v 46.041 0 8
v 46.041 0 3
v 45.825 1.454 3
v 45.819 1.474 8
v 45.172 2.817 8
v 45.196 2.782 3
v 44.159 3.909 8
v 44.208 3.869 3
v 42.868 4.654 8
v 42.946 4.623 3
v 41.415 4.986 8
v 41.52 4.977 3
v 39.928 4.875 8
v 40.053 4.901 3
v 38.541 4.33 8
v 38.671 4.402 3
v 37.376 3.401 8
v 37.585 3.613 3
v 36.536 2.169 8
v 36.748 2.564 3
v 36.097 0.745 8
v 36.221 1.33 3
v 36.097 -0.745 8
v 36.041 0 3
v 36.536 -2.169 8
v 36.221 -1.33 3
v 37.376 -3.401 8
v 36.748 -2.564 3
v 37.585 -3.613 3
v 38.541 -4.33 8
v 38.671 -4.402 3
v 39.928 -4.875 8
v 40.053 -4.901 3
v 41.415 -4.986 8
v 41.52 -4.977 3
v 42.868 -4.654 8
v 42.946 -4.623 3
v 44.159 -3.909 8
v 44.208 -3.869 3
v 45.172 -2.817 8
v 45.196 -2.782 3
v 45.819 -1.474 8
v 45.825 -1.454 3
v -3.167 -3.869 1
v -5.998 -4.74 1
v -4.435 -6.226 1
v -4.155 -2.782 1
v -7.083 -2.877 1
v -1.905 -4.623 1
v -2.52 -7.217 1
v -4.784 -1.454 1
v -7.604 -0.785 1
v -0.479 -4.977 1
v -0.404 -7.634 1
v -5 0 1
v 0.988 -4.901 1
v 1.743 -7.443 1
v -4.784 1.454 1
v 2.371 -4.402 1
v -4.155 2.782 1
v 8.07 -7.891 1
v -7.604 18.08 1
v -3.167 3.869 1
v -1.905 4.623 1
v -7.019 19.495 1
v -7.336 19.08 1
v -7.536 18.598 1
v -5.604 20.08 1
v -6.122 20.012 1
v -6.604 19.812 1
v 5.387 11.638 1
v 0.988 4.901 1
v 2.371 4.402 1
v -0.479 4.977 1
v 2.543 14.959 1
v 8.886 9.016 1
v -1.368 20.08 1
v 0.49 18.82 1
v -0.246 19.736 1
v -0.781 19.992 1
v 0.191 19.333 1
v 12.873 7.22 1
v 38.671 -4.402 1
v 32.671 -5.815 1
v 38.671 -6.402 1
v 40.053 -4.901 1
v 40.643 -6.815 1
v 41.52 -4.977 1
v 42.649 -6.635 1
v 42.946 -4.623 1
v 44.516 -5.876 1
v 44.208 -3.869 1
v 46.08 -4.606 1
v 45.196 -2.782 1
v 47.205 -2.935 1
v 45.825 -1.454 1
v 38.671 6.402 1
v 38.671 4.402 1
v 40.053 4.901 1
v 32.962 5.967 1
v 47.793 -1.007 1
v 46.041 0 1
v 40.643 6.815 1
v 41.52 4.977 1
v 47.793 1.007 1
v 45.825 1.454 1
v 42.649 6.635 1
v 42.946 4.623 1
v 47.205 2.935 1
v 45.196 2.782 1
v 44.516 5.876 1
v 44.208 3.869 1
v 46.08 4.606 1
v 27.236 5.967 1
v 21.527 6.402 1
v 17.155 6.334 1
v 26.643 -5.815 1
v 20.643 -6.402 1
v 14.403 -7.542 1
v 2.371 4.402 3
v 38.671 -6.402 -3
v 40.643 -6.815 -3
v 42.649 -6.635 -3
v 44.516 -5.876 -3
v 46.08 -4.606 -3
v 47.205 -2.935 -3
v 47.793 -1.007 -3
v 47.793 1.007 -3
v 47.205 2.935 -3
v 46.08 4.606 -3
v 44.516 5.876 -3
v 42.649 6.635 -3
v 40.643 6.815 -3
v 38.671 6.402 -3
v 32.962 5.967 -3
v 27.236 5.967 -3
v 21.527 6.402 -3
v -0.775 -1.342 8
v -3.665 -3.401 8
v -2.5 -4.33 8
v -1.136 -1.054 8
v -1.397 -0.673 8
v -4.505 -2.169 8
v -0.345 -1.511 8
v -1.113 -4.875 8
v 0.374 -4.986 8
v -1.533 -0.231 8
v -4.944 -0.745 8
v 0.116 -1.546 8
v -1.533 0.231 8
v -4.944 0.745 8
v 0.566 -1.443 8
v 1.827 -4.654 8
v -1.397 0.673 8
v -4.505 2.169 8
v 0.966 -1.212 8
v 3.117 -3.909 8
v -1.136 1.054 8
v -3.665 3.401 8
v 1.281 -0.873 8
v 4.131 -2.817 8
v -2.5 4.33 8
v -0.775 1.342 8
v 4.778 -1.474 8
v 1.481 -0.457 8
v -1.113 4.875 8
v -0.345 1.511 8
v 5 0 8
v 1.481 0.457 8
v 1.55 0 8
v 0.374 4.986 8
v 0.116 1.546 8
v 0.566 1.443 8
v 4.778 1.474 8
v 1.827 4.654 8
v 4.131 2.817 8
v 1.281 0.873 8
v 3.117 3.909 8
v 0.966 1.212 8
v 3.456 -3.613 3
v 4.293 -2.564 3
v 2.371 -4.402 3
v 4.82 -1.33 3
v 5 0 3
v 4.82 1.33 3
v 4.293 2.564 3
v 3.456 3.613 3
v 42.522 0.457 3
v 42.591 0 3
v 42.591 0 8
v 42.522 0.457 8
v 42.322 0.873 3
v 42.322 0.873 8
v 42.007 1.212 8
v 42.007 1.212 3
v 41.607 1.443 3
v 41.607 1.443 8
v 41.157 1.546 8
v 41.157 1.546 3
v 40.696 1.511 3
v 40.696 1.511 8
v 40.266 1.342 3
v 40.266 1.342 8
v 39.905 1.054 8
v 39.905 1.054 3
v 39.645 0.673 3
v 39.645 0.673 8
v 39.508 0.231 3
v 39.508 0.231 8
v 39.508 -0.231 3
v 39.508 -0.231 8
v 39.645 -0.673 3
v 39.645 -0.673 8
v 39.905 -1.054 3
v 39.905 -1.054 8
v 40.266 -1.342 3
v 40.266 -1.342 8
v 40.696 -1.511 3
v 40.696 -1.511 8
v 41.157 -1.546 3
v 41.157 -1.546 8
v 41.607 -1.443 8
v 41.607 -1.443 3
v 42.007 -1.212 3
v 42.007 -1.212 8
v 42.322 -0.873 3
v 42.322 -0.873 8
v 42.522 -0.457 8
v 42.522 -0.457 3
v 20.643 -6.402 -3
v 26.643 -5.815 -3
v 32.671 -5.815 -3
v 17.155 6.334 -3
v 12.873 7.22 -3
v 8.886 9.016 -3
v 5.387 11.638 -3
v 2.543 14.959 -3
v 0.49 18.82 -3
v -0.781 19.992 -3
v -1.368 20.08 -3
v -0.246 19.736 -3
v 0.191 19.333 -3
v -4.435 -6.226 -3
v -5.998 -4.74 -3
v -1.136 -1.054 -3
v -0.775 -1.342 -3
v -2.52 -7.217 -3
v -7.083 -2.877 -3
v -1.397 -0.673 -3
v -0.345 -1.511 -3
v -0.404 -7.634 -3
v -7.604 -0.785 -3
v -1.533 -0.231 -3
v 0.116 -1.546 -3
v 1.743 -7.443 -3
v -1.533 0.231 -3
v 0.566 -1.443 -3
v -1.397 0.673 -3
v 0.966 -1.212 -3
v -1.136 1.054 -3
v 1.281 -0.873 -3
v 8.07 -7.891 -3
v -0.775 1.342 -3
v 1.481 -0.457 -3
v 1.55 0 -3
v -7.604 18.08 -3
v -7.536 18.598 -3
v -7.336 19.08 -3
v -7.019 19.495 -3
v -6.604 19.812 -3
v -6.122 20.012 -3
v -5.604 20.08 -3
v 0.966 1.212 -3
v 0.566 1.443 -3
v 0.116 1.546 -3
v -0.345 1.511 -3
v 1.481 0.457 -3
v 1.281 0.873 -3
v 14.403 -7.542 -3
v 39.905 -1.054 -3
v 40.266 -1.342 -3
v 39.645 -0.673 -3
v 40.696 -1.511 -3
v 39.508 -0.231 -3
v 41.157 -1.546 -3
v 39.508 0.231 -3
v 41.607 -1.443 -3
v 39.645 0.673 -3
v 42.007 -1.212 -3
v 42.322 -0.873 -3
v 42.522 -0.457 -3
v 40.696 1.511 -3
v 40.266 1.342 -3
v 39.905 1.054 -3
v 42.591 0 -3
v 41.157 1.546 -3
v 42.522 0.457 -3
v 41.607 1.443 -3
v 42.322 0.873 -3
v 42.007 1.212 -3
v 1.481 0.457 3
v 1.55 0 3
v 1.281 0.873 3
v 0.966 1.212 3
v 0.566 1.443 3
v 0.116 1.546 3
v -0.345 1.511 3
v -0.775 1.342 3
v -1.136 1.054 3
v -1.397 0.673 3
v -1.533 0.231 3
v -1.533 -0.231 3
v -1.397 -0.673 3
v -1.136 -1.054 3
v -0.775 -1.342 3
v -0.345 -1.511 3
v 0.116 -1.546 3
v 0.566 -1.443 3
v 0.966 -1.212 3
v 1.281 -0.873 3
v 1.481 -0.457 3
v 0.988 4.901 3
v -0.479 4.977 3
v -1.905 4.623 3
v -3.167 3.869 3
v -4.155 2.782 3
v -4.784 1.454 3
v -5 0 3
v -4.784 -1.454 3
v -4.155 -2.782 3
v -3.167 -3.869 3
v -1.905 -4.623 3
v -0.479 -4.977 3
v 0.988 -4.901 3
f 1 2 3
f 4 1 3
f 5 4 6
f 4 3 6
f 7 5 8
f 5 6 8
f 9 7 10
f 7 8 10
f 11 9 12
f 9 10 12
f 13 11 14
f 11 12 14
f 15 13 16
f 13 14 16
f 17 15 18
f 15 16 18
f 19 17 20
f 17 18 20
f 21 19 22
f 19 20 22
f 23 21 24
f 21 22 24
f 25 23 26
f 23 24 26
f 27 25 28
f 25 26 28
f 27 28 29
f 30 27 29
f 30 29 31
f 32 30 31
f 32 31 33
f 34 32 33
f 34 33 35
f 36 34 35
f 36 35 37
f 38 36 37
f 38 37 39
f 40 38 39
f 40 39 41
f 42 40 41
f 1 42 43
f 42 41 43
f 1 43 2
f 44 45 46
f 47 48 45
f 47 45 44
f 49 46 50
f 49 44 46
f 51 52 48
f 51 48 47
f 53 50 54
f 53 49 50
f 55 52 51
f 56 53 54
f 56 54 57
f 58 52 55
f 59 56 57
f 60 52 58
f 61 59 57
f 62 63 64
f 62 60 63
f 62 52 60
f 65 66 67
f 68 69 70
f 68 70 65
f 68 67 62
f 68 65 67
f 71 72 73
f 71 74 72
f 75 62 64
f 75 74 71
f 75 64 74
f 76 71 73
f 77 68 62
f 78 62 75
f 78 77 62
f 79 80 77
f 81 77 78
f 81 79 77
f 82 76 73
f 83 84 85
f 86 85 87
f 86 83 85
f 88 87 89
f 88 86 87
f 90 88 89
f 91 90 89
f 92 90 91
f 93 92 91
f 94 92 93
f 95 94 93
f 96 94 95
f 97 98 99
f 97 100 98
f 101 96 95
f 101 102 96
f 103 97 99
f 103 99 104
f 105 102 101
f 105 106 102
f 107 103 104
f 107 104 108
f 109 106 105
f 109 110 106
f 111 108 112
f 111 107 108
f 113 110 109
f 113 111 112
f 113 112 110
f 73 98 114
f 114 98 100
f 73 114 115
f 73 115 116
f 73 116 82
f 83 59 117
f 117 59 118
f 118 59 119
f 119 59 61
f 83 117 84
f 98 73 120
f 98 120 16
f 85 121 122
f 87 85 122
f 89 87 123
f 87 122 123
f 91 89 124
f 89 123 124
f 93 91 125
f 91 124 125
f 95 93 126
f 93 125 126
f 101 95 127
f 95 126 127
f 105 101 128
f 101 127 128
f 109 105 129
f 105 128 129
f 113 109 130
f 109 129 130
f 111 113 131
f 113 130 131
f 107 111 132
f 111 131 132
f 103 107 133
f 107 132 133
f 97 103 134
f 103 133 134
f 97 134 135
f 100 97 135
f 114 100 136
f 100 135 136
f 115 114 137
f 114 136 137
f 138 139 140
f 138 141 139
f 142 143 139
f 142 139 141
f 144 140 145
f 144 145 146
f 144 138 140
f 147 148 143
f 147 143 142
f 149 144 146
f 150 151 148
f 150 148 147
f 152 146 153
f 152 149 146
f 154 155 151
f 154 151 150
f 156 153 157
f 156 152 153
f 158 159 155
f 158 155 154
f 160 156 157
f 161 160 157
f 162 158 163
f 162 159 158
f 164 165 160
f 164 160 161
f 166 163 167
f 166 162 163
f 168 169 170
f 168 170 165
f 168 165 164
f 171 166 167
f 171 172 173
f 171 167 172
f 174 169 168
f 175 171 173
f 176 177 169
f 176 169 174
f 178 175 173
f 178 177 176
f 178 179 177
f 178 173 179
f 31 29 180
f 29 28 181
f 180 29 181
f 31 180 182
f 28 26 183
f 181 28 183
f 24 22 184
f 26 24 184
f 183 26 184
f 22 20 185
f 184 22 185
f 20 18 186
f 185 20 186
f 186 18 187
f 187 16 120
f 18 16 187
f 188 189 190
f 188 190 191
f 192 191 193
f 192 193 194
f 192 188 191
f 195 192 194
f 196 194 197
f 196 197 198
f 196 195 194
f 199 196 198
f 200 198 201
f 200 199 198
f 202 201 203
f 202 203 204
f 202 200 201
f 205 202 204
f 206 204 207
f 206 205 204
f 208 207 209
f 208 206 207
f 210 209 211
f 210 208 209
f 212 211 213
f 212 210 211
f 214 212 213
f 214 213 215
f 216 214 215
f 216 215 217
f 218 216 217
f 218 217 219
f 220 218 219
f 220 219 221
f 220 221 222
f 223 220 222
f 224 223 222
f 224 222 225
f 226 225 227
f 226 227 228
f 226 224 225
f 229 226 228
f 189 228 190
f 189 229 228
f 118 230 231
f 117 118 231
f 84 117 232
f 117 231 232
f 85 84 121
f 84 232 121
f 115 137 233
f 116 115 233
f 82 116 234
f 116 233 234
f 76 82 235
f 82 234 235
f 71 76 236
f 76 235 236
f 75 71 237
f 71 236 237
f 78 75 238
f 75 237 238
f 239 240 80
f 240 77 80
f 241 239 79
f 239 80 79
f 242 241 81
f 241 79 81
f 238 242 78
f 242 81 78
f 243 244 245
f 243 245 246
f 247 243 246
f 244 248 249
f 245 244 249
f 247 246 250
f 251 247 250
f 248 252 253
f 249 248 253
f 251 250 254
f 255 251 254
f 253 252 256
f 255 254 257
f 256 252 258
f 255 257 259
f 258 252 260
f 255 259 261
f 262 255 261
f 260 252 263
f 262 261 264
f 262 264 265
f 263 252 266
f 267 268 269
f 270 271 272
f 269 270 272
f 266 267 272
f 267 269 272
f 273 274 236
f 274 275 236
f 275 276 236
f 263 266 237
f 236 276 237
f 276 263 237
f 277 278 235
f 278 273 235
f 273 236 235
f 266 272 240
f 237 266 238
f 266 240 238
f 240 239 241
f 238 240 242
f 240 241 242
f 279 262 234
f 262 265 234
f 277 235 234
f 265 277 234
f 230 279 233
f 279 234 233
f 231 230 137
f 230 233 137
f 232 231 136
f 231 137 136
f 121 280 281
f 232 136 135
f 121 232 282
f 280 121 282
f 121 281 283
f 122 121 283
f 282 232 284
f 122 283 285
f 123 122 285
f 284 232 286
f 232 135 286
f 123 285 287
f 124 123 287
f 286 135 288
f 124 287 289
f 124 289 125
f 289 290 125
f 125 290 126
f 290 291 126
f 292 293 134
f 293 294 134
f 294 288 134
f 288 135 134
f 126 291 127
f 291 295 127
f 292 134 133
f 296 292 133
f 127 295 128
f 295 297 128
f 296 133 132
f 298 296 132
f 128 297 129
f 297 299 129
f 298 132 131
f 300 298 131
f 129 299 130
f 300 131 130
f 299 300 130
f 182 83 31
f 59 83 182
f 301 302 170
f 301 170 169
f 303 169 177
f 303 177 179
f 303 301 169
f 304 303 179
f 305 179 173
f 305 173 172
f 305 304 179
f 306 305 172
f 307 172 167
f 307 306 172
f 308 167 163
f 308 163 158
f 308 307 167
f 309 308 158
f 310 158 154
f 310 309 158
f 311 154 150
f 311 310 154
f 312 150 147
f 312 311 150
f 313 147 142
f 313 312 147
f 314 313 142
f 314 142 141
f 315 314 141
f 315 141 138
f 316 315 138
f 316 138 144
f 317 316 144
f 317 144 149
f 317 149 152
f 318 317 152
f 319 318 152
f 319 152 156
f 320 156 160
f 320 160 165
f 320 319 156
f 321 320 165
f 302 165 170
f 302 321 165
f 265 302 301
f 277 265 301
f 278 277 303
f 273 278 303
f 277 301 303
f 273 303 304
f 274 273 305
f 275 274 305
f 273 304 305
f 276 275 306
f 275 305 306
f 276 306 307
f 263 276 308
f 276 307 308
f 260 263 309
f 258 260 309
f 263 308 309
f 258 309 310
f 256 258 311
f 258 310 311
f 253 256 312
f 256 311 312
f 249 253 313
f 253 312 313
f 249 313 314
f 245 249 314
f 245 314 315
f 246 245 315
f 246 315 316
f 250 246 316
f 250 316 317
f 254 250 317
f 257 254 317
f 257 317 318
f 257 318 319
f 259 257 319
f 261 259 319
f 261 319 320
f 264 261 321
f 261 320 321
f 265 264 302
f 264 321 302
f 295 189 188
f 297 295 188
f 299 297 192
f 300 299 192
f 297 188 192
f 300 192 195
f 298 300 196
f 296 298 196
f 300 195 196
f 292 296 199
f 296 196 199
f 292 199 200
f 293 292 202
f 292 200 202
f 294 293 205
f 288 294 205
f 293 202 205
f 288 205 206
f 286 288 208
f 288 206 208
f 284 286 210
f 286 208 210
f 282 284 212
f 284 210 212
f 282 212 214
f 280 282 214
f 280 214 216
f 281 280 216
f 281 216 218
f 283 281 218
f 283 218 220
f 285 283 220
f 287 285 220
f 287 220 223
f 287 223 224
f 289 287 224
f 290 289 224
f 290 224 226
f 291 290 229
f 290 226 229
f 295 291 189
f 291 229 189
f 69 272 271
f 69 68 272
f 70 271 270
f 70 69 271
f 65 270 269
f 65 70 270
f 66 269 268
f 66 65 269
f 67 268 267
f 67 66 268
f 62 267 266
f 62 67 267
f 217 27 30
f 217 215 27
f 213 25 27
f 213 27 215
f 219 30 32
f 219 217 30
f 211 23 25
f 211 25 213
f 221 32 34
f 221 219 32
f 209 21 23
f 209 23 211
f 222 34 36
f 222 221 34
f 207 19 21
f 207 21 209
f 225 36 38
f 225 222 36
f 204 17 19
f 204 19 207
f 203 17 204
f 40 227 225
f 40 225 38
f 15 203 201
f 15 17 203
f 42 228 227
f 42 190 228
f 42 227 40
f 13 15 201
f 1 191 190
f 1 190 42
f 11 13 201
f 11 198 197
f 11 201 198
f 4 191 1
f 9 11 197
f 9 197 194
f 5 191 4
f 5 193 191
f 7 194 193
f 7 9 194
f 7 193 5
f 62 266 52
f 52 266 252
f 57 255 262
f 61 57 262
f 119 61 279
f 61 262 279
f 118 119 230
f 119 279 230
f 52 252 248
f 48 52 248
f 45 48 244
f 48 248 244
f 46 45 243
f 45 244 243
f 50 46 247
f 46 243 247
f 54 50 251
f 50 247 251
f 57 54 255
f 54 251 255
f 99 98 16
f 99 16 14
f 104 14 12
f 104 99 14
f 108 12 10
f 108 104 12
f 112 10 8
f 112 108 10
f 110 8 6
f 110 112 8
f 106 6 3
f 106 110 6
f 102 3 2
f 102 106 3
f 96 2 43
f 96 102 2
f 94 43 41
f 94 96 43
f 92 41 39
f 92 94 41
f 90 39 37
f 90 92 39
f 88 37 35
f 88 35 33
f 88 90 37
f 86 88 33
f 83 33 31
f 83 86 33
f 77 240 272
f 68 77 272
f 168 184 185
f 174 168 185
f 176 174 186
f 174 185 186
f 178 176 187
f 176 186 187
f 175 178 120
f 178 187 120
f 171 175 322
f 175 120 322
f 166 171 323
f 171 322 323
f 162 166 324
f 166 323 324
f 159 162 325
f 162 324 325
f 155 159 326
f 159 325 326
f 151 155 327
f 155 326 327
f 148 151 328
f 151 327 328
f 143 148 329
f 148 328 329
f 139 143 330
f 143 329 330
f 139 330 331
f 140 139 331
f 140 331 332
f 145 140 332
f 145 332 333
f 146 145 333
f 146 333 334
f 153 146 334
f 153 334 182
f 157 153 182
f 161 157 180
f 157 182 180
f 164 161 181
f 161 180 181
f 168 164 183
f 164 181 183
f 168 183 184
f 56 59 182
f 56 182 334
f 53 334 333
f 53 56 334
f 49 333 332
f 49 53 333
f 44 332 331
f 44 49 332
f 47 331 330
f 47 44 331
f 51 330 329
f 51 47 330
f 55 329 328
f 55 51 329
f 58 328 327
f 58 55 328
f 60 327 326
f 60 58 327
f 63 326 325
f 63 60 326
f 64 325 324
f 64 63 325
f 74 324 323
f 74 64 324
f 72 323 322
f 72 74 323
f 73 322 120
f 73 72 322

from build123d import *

# Parameters (mm, degrees)
BOSS_EXTRU_1_DEPTH      = 3
BOSS_EXTRU_1_DEPTH_BACK = 3
ESQUISSE2_R             = 1.55
ENL_V_MAT_EXTRU_1_DEPTH = 6
SKETCH1_R               = 5
SKETCH1_R_2             = 1.55
BOSS_EXTRUDE1_DEPTH     = 5
BOSS_EXTRUDE3_DEPTH     = 4
FILLET1_R               = 2


with BuildPart() as part:
    # Esquisse1 → Boss.-Extru.1 (new, two sides: drawn at the far end of the back side and taken through both)
    with BuildSketch(Plane.XY.offset(-BOSS_EXTRU_1_DEPTH_BACK)):
        with BuildLine():
            Line((2.370532565, 4.402337488), (38.670532565, 4.402337488))
            ThreePointArc((38.670532565, 4.402337488), (46.041065131, 0), (38.670532565, -4.402337488))
            Line((38.670532565, -4.402337488), (2.370532565, -4.402337488))
            ThreePointArc((2.370532565, -4.402337488), (-5, 0), (2.370532565, 4.402337488))
        make_face()
    extrude(amount=BOSS_EXTRU_1_DEPTH + BOSS_EXTRU_1_DEPTH_BACK)

    # Esquisse2 → Enlèv. mat.-Extru.1 (cut)
    with BuildSketch(Plane.XY.offset(3)):
        Circle(ESQUISSE2_R)
        with Locations((41.041065131, 0)):
            Circle(ESQUISSE2_R)
    extrude(amount=-ENL_V_MAT_EXTRU_1_DEPTH, mode=Mode.SUBTRACT)

    # Sketch1 → Boss-Extrude1 (add)
    # profile 1 of 2: a face of its own
    with BuildSketch(Plane.XY.offset(3)):
        Circle(SKETCH1_R)
        Circle(SKETCH1_R_2, mode=Mode.SUBTRACT)
    # profile 2 of 2: a face of its own
    with BuildSketch(Plane.XY.offset(3)):
        with Locations((41.041065131, 0)):
            Circle(SKETCH1_R)
        with Locations((41.041065131, 0)):
            Circle(SKETCH1_R_2, mode=Mode.SUBTRACT)
    extrude(amount=BOSS_EXTRUDE1_DEPTH)

    # Sketch3 → Boss-Extrude3 (add)
    with BuildSketch(Plane(origin=(0, 0, -3), x_dir=(-1, 0, 0), z_dir=(0, 0, -1))):
        with BuildLine():
            Line((-0.036278369, 20.080410503), (7.604339365, 20.080410503))
            Line((7.604339365, 20.080410503), (7.604339365, -0.784525769))
            ThreePointArc((7.604339365, -0.784525769), (4.435345697, -6.226489092), (-1.743406195, -7.443251487))
            ThreePointArc((-1.743406195, -7.443251487), (-11.242367754, -7.816197838), (-20.642918726, -6.402337488))
            ThreePointArc((-20.642918726, -6.402337488), (-29.656725646, -5.741977649), (-38.670532565, -6.402337488))
            ThreePointArc((-38.670532565, -6.402337488), (-47.868169198, 0), (-38.670532565, 6.402337488))
            ThreePointArc((-38.670532565, 6.402337488), (-30.098734584, 5.912843699), (-21.526936603, 6.402337488))
            ThreePointArc((-21.526936603, 6.402337488), (-8.31538788, 9.366509266), (-0.036278369, 20.080410503))
        make_face()
        with BuildLine():
            Line((-38.670532565, 4.402337488), (-2.370532565, 4.402337488))
            ThreePointArc((-2.370532565, 4.402337488), (5, 0), (-2.370532565, -4.402337488))
            Line((-2.370532565, -4.402337488), (-38.670532565, -4.402337488))
            ThreePointArc((-38.670532565, -4.402337488), (-46.041065131, 0), (-38.670532565, 4.402337488))
        make_face(mode=Mode.SUBTRACT)
    extrude(amount=-BOSS_EXTRUDE3_DEPTH)

    # Fillet1
    fillet1_edges = [part.edges().sort_by_distance(p)[0] for p in [
        (0.036278369, 20.080410503, -1),
        (-7.604339365, 20.080410503, -1),
    ]]
    fillet(fillet1_edges, radius=FILLET1_R)


solid = part.part
